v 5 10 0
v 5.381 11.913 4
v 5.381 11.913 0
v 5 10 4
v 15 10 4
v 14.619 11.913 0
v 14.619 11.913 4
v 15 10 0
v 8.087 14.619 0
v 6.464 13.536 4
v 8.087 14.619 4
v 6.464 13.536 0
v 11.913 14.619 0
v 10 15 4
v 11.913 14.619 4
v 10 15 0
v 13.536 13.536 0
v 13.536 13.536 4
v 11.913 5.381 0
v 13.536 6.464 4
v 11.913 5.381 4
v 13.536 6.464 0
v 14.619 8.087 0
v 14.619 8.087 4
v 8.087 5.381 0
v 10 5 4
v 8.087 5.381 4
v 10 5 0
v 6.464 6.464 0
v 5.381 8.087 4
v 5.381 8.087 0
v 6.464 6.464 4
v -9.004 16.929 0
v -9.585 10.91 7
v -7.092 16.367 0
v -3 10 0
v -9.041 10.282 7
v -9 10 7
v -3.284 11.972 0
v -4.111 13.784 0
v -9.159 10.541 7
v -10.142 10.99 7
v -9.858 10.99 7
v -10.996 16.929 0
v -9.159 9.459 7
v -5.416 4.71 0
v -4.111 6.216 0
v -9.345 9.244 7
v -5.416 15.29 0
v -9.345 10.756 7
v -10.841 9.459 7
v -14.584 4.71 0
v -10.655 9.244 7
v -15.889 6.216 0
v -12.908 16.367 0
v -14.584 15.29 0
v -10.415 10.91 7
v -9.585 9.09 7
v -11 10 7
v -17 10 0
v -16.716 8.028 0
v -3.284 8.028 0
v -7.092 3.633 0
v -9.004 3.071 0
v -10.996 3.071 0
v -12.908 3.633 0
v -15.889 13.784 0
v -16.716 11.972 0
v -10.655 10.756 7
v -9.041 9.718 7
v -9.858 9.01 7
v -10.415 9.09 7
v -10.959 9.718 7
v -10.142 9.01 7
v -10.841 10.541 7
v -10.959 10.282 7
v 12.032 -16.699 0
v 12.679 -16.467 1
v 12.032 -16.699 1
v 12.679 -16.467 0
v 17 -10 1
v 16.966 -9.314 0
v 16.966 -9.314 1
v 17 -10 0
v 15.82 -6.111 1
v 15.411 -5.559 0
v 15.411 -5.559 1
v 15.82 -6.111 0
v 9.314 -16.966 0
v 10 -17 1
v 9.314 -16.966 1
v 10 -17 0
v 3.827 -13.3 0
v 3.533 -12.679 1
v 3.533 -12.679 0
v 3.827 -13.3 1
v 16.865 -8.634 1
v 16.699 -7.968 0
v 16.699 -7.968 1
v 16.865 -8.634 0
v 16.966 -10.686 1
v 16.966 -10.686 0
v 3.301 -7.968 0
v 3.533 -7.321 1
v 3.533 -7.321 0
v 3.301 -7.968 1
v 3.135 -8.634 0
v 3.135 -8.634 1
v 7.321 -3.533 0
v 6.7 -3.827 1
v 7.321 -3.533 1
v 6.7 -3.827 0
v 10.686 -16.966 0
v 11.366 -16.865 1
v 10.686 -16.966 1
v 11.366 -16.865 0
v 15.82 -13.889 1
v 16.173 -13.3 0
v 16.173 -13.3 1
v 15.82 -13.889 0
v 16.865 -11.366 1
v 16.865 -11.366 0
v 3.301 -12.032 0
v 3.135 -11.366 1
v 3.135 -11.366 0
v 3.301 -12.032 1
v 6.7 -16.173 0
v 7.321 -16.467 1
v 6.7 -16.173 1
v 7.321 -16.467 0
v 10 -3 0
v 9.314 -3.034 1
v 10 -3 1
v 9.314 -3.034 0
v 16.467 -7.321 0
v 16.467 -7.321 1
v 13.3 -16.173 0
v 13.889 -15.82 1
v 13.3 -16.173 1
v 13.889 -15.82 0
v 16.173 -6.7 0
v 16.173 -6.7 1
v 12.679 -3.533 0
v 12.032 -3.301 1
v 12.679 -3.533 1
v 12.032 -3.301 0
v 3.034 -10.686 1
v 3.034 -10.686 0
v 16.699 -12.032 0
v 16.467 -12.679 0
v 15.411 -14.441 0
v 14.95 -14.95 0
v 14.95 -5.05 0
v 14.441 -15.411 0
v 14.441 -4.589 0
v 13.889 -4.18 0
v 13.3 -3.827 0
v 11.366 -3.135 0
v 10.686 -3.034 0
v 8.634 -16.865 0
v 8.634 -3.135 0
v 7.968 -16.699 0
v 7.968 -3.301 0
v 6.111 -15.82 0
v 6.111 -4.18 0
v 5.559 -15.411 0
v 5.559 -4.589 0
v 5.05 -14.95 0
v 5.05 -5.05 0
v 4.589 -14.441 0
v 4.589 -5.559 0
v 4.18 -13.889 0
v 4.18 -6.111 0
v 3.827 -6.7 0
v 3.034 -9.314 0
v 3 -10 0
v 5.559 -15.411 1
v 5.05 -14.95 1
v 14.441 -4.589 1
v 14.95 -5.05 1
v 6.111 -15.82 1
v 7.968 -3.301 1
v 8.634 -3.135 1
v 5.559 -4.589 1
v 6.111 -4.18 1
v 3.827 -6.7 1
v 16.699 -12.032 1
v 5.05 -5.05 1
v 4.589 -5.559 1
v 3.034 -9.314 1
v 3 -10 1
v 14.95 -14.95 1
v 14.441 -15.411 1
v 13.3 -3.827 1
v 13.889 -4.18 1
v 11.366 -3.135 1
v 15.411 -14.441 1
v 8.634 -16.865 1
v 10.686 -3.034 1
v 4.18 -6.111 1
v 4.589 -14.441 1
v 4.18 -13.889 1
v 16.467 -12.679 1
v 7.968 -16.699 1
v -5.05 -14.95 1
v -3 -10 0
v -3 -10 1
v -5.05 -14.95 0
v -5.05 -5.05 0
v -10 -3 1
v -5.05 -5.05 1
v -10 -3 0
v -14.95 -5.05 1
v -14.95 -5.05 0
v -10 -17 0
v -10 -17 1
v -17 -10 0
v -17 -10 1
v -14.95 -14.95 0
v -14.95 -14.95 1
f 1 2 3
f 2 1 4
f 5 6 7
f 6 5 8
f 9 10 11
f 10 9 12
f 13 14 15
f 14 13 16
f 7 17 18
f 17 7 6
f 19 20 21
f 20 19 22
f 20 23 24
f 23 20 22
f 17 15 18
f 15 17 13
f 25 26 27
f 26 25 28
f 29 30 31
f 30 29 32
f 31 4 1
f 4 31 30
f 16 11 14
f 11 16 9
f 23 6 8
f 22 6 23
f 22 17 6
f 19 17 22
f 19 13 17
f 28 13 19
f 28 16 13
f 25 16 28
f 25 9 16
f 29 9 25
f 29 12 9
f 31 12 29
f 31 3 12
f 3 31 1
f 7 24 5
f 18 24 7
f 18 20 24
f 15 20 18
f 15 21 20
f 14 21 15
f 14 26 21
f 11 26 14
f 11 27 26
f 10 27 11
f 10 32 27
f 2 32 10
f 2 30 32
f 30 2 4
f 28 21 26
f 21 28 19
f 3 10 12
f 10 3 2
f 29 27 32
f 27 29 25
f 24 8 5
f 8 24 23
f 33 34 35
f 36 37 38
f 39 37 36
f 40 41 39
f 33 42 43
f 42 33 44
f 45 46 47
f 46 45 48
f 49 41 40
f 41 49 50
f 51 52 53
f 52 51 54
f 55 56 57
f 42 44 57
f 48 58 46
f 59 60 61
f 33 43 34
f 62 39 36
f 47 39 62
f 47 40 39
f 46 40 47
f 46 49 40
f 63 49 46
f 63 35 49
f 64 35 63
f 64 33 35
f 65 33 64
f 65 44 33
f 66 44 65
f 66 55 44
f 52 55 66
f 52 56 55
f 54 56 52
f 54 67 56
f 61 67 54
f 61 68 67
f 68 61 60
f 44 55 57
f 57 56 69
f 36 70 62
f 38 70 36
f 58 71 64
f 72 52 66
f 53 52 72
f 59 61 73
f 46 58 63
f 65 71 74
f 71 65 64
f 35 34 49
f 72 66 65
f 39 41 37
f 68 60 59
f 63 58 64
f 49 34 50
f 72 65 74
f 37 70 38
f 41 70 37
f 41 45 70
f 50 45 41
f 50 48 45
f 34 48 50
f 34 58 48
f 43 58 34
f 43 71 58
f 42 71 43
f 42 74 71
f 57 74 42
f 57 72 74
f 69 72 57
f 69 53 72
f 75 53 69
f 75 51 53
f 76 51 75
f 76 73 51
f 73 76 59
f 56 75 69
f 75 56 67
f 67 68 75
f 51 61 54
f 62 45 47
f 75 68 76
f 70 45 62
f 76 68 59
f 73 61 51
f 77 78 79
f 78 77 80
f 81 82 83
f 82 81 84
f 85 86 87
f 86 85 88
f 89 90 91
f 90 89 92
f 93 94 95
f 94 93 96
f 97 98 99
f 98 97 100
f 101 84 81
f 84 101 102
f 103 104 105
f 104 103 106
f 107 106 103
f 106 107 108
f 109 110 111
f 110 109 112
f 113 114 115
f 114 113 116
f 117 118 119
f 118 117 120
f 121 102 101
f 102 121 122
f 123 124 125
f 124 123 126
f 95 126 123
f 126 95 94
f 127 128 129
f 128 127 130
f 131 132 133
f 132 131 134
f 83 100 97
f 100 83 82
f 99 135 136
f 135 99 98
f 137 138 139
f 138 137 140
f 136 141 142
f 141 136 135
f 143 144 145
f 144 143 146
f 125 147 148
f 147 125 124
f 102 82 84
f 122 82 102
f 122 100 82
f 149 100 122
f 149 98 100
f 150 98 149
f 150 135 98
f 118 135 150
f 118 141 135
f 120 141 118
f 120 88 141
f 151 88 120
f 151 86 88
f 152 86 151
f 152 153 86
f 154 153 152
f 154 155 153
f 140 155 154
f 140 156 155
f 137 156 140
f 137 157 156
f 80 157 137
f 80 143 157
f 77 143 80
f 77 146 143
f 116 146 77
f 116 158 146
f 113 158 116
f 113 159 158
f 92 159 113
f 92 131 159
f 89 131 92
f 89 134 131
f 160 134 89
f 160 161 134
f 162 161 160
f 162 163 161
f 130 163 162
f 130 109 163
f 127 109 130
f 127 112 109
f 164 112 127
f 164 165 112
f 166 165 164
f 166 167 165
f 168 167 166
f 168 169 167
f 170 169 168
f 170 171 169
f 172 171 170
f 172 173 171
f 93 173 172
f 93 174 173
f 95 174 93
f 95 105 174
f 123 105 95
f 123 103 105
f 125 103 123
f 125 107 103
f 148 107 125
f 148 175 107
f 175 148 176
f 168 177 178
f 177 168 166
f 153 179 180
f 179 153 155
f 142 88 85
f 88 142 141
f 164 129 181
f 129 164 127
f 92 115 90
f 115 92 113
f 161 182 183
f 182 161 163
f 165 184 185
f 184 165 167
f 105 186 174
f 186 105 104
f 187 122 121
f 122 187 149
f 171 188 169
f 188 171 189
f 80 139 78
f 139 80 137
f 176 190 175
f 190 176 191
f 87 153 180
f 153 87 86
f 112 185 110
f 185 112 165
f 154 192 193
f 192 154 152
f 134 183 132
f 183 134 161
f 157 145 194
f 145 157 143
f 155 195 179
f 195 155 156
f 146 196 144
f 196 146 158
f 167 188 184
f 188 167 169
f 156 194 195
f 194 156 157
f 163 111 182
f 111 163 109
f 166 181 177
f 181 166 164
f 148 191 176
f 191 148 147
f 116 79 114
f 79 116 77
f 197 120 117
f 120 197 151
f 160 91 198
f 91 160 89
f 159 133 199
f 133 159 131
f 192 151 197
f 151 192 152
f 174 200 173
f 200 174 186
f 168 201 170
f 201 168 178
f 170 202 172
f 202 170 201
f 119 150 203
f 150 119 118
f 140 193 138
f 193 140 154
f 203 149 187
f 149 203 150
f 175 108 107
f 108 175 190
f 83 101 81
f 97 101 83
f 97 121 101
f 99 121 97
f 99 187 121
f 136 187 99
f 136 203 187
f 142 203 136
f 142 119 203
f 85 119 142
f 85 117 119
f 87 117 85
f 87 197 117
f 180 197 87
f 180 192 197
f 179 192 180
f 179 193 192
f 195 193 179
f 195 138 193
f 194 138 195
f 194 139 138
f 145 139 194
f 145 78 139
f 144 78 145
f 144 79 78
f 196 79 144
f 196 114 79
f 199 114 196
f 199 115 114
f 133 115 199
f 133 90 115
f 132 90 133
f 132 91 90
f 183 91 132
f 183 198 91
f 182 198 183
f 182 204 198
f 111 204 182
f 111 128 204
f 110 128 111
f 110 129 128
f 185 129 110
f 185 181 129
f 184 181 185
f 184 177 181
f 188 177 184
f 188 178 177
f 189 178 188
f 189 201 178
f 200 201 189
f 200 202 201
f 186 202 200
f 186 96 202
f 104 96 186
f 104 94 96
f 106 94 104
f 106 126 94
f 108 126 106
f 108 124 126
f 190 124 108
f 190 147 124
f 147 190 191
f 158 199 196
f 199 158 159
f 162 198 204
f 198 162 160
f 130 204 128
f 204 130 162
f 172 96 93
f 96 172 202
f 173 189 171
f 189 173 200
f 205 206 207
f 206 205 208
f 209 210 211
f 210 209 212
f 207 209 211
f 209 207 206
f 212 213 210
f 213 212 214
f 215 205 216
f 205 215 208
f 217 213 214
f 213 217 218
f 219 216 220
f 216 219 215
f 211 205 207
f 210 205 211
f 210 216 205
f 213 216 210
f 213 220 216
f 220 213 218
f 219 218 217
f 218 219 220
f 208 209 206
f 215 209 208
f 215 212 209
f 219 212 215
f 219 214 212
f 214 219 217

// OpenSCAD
// [ cylinder ]
// r1, r2: Radius an beiden Enden ODER
// r: wenn Radius gleich
// h: Höhe

translate([10,10,0]) cylinder(r=5, h=4);
translate([-10,10,0]) cylinder(r1=7, r2=1, h=7);
translate([10,-10,0]) cylinder(r=7, $fn=64);
translate([-10,-10,0]) cylinder(r=7, $fn=8);
